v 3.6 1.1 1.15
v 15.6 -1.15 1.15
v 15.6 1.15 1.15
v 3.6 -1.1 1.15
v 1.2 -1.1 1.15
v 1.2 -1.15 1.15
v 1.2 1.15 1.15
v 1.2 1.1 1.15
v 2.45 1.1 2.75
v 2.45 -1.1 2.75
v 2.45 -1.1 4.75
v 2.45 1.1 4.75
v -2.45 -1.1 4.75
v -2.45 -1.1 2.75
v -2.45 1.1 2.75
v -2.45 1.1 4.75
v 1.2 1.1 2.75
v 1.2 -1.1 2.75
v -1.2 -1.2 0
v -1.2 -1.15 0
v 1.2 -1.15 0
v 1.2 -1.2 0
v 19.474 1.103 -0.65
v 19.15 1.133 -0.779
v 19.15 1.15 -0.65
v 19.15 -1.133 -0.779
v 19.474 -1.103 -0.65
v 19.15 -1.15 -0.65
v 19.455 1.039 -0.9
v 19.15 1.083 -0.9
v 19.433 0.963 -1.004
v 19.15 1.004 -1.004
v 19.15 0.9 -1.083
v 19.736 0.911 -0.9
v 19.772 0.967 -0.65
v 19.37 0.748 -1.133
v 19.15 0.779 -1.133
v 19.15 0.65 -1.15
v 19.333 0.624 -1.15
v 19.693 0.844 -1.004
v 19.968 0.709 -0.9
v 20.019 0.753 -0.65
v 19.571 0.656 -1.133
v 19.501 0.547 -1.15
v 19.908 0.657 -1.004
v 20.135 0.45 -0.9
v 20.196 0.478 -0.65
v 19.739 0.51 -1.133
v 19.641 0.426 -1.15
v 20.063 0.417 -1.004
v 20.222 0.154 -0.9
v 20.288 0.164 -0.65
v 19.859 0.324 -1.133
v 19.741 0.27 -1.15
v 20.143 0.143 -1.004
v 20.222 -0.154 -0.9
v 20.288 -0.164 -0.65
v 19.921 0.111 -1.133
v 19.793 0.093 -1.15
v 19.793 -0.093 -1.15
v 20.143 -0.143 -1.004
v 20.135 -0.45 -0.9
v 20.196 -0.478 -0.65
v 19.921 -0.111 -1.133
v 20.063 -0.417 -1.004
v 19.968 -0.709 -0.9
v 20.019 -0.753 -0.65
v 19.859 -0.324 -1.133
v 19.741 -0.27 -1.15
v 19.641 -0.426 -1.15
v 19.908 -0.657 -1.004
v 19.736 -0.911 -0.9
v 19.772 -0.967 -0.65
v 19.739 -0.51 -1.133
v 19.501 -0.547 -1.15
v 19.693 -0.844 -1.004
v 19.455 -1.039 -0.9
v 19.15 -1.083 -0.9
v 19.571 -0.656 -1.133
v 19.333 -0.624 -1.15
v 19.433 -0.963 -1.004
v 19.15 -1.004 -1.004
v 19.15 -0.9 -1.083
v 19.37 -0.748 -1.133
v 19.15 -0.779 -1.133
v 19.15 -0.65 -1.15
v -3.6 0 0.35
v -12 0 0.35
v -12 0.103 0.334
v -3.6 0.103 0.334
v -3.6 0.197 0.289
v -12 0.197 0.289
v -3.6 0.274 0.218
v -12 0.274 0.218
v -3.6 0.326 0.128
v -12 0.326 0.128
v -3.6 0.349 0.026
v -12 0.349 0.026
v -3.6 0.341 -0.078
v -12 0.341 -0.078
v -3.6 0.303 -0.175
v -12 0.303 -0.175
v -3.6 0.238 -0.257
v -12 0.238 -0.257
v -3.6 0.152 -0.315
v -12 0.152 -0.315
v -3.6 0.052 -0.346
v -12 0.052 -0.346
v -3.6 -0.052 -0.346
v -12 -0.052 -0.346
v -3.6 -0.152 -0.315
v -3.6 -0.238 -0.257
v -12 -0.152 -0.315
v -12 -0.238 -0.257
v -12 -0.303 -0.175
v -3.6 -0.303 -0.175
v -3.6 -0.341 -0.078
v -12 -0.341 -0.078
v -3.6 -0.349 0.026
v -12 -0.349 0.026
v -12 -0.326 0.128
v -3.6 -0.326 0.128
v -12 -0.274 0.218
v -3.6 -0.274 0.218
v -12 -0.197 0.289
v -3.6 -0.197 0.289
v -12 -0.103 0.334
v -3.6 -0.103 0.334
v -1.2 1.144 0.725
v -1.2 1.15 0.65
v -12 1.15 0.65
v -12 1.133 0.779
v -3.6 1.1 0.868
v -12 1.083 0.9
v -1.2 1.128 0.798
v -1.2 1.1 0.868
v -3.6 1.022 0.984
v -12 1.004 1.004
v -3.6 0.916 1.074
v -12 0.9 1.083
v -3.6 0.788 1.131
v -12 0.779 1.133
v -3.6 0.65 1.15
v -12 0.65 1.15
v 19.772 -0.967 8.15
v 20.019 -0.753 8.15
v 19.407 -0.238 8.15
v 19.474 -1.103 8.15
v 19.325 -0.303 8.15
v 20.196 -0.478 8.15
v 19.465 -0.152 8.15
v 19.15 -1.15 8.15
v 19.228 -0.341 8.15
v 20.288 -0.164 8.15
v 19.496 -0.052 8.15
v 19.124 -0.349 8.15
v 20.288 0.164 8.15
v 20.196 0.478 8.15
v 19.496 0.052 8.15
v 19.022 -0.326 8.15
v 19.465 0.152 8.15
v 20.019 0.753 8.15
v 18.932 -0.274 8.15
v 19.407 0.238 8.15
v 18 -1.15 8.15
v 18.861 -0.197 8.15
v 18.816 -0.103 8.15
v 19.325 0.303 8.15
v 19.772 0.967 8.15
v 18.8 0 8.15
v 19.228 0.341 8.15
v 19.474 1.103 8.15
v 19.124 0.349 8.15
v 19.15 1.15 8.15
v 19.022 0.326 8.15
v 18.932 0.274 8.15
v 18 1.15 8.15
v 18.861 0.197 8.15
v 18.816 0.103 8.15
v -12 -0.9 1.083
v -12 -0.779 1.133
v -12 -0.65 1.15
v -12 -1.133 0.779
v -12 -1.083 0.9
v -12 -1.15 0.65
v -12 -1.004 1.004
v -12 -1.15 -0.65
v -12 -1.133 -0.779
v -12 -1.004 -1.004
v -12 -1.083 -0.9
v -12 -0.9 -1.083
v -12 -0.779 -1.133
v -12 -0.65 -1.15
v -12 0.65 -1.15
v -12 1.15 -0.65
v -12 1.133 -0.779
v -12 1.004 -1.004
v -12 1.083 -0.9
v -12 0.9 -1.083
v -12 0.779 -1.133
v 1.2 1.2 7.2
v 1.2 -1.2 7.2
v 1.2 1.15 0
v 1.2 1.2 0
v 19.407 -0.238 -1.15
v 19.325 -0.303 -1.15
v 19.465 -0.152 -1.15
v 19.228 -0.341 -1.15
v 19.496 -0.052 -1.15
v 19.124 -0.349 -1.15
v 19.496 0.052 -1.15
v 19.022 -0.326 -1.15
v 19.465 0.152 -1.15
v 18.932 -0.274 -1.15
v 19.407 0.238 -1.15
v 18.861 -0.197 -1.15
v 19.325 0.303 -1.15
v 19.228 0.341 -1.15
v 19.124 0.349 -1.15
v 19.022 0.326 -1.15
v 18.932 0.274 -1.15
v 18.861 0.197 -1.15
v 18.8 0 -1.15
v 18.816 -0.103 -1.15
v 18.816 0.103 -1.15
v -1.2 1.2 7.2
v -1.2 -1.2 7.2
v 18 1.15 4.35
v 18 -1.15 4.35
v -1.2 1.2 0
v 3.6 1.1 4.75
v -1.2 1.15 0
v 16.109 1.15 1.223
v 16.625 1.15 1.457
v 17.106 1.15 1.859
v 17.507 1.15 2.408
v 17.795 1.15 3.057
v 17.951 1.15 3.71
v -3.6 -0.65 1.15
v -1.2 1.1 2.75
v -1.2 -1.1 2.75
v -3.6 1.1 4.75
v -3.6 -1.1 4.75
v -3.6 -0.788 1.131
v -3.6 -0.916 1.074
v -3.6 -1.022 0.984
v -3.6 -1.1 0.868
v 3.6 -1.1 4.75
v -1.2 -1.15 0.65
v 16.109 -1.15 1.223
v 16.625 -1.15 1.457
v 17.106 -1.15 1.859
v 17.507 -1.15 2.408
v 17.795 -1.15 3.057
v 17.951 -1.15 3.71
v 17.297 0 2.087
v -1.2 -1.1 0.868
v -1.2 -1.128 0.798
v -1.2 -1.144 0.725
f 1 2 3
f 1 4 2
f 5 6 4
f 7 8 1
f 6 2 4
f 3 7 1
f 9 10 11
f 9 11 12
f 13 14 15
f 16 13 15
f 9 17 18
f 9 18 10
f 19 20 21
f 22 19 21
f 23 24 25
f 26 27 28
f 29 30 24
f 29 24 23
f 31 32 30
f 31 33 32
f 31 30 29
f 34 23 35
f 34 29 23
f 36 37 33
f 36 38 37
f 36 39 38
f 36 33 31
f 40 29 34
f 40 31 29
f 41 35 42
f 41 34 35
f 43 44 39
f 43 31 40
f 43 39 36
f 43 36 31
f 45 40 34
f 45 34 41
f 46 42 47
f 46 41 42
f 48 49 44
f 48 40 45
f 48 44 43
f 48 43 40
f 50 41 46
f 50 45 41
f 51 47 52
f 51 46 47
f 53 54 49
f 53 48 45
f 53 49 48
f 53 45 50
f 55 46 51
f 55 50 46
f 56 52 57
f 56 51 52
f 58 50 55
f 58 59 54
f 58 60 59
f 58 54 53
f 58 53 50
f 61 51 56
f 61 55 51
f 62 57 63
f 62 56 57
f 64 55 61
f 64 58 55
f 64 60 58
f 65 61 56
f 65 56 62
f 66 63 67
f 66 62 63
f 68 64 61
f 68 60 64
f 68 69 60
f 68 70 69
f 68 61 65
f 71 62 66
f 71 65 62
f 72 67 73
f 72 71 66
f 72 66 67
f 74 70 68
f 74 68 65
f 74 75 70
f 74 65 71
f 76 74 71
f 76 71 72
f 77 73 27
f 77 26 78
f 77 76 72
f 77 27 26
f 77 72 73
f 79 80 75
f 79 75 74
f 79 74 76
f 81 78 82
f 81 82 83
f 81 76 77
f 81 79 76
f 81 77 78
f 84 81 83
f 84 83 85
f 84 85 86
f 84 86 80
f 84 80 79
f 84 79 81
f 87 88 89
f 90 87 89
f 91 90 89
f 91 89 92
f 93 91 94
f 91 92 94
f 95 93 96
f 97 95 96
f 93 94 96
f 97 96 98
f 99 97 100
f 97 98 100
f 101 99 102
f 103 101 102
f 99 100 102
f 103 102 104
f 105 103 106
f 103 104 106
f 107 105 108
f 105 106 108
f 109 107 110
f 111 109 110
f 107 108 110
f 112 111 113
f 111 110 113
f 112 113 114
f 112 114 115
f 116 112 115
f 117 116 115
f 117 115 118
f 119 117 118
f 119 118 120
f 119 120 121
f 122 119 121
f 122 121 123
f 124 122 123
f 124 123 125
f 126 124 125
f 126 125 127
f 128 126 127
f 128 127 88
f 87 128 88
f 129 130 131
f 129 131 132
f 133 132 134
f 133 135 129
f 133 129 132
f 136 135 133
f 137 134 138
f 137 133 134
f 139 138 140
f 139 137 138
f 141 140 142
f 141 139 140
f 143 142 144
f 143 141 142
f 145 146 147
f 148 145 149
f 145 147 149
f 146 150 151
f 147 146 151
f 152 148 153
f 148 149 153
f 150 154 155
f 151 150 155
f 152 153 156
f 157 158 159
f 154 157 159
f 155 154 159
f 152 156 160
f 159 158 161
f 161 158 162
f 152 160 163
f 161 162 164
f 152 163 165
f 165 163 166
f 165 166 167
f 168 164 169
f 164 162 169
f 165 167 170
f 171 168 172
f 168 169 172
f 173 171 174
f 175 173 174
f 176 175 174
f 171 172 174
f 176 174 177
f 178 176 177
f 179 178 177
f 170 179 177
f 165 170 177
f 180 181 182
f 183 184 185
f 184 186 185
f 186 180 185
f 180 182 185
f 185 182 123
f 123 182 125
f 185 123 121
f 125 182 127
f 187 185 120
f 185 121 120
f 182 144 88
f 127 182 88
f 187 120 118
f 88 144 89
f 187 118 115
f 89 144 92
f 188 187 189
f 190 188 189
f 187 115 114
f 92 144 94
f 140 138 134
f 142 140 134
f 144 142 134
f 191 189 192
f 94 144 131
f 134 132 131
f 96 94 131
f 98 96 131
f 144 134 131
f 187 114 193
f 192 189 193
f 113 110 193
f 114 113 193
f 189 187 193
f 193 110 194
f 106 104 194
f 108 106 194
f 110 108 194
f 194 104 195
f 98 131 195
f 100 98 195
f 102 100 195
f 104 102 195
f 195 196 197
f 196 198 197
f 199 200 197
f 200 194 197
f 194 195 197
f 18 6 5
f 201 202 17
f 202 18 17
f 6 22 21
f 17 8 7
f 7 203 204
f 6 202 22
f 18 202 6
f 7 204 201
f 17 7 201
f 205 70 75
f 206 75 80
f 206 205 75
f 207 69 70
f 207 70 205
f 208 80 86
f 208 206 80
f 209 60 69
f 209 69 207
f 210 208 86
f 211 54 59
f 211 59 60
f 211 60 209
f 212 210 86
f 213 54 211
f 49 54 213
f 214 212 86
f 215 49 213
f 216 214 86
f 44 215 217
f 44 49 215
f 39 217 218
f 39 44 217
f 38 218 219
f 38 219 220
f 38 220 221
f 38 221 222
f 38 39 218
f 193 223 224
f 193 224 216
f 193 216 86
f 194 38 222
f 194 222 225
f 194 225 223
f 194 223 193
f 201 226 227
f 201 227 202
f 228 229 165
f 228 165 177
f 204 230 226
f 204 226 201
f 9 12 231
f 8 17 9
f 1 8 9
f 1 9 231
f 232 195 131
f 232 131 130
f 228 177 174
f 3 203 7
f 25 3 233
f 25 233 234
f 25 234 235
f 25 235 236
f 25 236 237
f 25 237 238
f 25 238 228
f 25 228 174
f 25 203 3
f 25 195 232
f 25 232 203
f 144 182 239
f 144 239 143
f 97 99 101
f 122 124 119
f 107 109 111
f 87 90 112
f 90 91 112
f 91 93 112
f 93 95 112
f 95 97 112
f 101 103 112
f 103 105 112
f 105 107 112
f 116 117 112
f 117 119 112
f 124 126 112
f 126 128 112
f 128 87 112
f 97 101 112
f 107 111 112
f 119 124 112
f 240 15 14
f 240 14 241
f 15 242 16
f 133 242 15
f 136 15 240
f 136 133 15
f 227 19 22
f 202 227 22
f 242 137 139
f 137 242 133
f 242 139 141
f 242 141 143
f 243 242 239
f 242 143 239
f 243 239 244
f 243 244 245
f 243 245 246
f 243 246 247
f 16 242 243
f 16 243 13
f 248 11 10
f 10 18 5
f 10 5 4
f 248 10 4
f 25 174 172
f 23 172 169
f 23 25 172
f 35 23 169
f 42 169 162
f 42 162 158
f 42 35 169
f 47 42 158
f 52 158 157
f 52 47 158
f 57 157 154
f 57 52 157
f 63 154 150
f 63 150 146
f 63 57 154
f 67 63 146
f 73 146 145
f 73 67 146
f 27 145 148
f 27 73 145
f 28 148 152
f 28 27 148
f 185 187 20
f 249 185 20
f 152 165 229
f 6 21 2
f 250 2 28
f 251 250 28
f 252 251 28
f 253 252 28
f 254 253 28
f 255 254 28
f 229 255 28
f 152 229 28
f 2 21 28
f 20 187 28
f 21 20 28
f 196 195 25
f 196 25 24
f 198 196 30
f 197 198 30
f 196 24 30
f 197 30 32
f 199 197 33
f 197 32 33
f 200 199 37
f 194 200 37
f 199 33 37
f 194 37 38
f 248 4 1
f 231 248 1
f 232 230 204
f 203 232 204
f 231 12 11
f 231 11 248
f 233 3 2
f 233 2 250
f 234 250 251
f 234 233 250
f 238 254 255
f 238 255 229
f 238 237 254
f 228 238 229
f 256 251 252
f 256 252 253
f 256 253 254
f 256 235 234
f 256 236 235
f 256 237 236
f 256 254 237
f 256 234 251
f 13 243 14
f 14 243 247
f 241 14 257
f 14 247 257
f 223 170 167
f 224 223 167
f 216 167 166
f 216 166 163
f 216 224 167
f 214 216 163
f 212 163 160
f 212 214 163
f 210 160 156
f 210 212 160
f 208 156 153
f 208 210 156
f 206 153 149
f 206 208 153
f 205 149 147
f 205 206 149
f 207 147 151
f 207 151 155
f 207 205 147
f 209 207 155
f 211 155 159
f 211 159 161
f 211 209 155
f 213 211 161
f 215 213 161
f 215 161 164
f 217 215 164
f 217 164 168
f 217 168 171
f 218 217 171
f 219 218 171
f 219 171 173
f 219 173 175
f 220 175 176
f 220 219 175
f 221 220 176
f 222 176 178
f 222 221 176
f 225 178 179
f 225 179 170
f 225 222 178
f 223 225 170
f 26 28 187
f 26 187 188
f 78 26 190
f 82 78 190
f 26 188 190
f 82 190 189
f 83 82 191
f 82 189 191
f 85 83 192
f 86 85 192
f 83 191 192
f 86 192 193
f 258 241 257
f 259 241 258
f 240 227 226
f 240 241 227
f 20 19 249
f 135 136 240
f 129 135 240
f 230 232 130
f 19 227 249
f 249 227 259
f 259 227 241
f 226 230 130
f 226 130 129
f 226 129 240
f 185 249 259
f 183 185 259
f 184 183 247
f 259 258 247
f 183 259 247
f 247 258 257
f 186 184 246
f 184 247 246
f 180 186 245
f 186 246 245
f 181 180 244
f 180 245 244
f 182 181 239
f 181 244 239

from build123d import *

# Parameters (mm, degrees)
SKETCH_1_W           = 2.4
SKETCH_1_H           = 2.4
EXTRUDE_1_DEPTH      = 7.2
EXTRUDE_2_DEPTH      = 18
EXTRUDE_2_DEPTH_BACK = 12
SKETCH_4_W           = 2.3
SKETCH_4_H           = 2.3
EXTRUDE_3_DEPTH      = 7
EXTRUDE_3_DEPTH_BACK = 2.3
SKETCH_5_R           = 0.35
SKETCH_6_R           = 0.35
CUT_EXTRUDE_1_DEPTH  = 10
FILLET_1_SIZE        = 2.4
FILLET_1_SIZE_2      = 3.2
FILLET_2_R           = 0.5
EXTRUDE_START        = -1.5
SKETCH_7_W           = 1.15
SKETCH_7_H           = 0.45
SKETCH_7_H_2         = 1.3
SKETCH_7_H_3         = 2.2
EXTRUDE_4_DEPTH      = 5.1
SKETCH_8_W           = 7.2
SKETCH_8_H           = 2.2
EXTRUDE_5_DEPTH      = 3.1


with BuildPart() as part:
    # 草图1 → 凸台-拉伸1 (new body)
    with BuildSketch(Plane.XY):
        Rectangle(SKETCH_1_W, SKETCH_1_H)
    extrude(amount=EXTRUDE_1_DEPTH)

    # 草图4 → 凸台-拉伸2 (add, two sides: drawn at the far end of the back side and taken through both)
    with BuildSketch(Plane(origin=(0, 0, 0), x_dir=(0, 0, -1), z_dir=(1, 0, 0)).offset(-EXTRUDE_2_DEPTH_BACK)):
        Rectangle(SKETCH_4_W, SKETCH_4_H)
    extrude(amount=EXTRUDE_2_DEPTH + EXTRUDE_2_DEPTH_BACK)

    # 草图5 → 凸台-拉伸3 (add, two sides: drawn at the far end of the back side and taken through both)
    with BuildSketch(Plane.XY.offset(1.15).offset(-EXTRUDE_3_DEPTH_BACK)):
        with BuildLine():
            Line((18, 0), (18, 1.15))
            Line((18, 1.15), (19.15, 1.15))
            ThreePointArc((19.15, 1.15), (20.3, 0), (19.15, -1.15))
            Line((19.15, -1.15), (18, -1.15))
            Line((18, -1.15), (18, 0))
        make_face()
        with Locations(Location((19.15, 0, 0), (0, 0, 180))):
            Circle(SKETCH_5_R, mode=Mode.SUBTRACT)
    extrude(amount=EXTRUDE_3_DEPTH + EXTRUDE_3_DEPTH_BACK)

    # 草图6 → 切除-拉伸1 (cut)
    with BuildSketch(Plane.ZY.offset(12)):
        Circle(SKETCH_6_R)
    extrude(amount=-CUT_EXTRUDE_1_DEPTH, mode=Mode.SUBTRACT)

    # 圆角1
    # an asymmetric fillet: 3.2, 2.4 mm, written as the material it adds along each edge
    with BuildSketch(Plane(origin=(18, 1.15, 1.15), x_dir=(-1, 0, 0), z_dir=(0, -1, 0))) as fillet_1_piece_1:
        with BuildLine():
            Bezier((FILLET_1_SIZE, 0), (0, 0), (0, -FILLET_1_SIZE_2), weights=[1, 0.707106781, 1])
            Line((0, -FILLET_1_SIZE_2), (0, 0))
            Line((0, 0), (FILLET_1_SIZE, 0))
        make_face()
    extrude(amount=2.3)

    # 圆角2
    fillet_2_edges = [part.edges().sort_by_distance(p)[0] for p in [
        (-6.6, -1.15, 1.15),
        (3.575, -1.15, -1.15),
        (-6.6, 1.15, 1.15),
        (3.575, 1.15, -1.15),
        (20.3, 0, -1.15),
    ]]
    fillet(fillet_2_edges, radius=FILLET_2_R)

    # 草图7 → 凸台-拉伸4 (add)
    with BuildSketch(Plane.XY.offset(1.15).offset(EXTRUDE_START)):
        with Locations((-3.025, 0.875)):
            Rectangle(SKETCH_7_W, SKETCH_7_H)
        with Locations((-3.025, 0)):
            Rectangle(SKETCH_7_W, SKETCH_7_H_2)
        with Locations((-3.025, -0.875)):
            Rectangle(SKETCH_7_W, SKETCH_7_H)
        with Locations((3.025, 0)):
            Rectangle(SKETCH_7_W, SKETCH_7_H_3)
    extrude(amount=EXTRUDE_4_DEPTH)

    # 草图8 → 凸台-拉伸5 (add)
    with BuildSketch(Plane.XY.offset(1.15).offset(EXTRUDE_START)):
        Rectangle(SKETCH_8_W, SKETCH_8_H)
    extrude(amount=EXTRUDE_5_DEPTH)


solid = part.part
